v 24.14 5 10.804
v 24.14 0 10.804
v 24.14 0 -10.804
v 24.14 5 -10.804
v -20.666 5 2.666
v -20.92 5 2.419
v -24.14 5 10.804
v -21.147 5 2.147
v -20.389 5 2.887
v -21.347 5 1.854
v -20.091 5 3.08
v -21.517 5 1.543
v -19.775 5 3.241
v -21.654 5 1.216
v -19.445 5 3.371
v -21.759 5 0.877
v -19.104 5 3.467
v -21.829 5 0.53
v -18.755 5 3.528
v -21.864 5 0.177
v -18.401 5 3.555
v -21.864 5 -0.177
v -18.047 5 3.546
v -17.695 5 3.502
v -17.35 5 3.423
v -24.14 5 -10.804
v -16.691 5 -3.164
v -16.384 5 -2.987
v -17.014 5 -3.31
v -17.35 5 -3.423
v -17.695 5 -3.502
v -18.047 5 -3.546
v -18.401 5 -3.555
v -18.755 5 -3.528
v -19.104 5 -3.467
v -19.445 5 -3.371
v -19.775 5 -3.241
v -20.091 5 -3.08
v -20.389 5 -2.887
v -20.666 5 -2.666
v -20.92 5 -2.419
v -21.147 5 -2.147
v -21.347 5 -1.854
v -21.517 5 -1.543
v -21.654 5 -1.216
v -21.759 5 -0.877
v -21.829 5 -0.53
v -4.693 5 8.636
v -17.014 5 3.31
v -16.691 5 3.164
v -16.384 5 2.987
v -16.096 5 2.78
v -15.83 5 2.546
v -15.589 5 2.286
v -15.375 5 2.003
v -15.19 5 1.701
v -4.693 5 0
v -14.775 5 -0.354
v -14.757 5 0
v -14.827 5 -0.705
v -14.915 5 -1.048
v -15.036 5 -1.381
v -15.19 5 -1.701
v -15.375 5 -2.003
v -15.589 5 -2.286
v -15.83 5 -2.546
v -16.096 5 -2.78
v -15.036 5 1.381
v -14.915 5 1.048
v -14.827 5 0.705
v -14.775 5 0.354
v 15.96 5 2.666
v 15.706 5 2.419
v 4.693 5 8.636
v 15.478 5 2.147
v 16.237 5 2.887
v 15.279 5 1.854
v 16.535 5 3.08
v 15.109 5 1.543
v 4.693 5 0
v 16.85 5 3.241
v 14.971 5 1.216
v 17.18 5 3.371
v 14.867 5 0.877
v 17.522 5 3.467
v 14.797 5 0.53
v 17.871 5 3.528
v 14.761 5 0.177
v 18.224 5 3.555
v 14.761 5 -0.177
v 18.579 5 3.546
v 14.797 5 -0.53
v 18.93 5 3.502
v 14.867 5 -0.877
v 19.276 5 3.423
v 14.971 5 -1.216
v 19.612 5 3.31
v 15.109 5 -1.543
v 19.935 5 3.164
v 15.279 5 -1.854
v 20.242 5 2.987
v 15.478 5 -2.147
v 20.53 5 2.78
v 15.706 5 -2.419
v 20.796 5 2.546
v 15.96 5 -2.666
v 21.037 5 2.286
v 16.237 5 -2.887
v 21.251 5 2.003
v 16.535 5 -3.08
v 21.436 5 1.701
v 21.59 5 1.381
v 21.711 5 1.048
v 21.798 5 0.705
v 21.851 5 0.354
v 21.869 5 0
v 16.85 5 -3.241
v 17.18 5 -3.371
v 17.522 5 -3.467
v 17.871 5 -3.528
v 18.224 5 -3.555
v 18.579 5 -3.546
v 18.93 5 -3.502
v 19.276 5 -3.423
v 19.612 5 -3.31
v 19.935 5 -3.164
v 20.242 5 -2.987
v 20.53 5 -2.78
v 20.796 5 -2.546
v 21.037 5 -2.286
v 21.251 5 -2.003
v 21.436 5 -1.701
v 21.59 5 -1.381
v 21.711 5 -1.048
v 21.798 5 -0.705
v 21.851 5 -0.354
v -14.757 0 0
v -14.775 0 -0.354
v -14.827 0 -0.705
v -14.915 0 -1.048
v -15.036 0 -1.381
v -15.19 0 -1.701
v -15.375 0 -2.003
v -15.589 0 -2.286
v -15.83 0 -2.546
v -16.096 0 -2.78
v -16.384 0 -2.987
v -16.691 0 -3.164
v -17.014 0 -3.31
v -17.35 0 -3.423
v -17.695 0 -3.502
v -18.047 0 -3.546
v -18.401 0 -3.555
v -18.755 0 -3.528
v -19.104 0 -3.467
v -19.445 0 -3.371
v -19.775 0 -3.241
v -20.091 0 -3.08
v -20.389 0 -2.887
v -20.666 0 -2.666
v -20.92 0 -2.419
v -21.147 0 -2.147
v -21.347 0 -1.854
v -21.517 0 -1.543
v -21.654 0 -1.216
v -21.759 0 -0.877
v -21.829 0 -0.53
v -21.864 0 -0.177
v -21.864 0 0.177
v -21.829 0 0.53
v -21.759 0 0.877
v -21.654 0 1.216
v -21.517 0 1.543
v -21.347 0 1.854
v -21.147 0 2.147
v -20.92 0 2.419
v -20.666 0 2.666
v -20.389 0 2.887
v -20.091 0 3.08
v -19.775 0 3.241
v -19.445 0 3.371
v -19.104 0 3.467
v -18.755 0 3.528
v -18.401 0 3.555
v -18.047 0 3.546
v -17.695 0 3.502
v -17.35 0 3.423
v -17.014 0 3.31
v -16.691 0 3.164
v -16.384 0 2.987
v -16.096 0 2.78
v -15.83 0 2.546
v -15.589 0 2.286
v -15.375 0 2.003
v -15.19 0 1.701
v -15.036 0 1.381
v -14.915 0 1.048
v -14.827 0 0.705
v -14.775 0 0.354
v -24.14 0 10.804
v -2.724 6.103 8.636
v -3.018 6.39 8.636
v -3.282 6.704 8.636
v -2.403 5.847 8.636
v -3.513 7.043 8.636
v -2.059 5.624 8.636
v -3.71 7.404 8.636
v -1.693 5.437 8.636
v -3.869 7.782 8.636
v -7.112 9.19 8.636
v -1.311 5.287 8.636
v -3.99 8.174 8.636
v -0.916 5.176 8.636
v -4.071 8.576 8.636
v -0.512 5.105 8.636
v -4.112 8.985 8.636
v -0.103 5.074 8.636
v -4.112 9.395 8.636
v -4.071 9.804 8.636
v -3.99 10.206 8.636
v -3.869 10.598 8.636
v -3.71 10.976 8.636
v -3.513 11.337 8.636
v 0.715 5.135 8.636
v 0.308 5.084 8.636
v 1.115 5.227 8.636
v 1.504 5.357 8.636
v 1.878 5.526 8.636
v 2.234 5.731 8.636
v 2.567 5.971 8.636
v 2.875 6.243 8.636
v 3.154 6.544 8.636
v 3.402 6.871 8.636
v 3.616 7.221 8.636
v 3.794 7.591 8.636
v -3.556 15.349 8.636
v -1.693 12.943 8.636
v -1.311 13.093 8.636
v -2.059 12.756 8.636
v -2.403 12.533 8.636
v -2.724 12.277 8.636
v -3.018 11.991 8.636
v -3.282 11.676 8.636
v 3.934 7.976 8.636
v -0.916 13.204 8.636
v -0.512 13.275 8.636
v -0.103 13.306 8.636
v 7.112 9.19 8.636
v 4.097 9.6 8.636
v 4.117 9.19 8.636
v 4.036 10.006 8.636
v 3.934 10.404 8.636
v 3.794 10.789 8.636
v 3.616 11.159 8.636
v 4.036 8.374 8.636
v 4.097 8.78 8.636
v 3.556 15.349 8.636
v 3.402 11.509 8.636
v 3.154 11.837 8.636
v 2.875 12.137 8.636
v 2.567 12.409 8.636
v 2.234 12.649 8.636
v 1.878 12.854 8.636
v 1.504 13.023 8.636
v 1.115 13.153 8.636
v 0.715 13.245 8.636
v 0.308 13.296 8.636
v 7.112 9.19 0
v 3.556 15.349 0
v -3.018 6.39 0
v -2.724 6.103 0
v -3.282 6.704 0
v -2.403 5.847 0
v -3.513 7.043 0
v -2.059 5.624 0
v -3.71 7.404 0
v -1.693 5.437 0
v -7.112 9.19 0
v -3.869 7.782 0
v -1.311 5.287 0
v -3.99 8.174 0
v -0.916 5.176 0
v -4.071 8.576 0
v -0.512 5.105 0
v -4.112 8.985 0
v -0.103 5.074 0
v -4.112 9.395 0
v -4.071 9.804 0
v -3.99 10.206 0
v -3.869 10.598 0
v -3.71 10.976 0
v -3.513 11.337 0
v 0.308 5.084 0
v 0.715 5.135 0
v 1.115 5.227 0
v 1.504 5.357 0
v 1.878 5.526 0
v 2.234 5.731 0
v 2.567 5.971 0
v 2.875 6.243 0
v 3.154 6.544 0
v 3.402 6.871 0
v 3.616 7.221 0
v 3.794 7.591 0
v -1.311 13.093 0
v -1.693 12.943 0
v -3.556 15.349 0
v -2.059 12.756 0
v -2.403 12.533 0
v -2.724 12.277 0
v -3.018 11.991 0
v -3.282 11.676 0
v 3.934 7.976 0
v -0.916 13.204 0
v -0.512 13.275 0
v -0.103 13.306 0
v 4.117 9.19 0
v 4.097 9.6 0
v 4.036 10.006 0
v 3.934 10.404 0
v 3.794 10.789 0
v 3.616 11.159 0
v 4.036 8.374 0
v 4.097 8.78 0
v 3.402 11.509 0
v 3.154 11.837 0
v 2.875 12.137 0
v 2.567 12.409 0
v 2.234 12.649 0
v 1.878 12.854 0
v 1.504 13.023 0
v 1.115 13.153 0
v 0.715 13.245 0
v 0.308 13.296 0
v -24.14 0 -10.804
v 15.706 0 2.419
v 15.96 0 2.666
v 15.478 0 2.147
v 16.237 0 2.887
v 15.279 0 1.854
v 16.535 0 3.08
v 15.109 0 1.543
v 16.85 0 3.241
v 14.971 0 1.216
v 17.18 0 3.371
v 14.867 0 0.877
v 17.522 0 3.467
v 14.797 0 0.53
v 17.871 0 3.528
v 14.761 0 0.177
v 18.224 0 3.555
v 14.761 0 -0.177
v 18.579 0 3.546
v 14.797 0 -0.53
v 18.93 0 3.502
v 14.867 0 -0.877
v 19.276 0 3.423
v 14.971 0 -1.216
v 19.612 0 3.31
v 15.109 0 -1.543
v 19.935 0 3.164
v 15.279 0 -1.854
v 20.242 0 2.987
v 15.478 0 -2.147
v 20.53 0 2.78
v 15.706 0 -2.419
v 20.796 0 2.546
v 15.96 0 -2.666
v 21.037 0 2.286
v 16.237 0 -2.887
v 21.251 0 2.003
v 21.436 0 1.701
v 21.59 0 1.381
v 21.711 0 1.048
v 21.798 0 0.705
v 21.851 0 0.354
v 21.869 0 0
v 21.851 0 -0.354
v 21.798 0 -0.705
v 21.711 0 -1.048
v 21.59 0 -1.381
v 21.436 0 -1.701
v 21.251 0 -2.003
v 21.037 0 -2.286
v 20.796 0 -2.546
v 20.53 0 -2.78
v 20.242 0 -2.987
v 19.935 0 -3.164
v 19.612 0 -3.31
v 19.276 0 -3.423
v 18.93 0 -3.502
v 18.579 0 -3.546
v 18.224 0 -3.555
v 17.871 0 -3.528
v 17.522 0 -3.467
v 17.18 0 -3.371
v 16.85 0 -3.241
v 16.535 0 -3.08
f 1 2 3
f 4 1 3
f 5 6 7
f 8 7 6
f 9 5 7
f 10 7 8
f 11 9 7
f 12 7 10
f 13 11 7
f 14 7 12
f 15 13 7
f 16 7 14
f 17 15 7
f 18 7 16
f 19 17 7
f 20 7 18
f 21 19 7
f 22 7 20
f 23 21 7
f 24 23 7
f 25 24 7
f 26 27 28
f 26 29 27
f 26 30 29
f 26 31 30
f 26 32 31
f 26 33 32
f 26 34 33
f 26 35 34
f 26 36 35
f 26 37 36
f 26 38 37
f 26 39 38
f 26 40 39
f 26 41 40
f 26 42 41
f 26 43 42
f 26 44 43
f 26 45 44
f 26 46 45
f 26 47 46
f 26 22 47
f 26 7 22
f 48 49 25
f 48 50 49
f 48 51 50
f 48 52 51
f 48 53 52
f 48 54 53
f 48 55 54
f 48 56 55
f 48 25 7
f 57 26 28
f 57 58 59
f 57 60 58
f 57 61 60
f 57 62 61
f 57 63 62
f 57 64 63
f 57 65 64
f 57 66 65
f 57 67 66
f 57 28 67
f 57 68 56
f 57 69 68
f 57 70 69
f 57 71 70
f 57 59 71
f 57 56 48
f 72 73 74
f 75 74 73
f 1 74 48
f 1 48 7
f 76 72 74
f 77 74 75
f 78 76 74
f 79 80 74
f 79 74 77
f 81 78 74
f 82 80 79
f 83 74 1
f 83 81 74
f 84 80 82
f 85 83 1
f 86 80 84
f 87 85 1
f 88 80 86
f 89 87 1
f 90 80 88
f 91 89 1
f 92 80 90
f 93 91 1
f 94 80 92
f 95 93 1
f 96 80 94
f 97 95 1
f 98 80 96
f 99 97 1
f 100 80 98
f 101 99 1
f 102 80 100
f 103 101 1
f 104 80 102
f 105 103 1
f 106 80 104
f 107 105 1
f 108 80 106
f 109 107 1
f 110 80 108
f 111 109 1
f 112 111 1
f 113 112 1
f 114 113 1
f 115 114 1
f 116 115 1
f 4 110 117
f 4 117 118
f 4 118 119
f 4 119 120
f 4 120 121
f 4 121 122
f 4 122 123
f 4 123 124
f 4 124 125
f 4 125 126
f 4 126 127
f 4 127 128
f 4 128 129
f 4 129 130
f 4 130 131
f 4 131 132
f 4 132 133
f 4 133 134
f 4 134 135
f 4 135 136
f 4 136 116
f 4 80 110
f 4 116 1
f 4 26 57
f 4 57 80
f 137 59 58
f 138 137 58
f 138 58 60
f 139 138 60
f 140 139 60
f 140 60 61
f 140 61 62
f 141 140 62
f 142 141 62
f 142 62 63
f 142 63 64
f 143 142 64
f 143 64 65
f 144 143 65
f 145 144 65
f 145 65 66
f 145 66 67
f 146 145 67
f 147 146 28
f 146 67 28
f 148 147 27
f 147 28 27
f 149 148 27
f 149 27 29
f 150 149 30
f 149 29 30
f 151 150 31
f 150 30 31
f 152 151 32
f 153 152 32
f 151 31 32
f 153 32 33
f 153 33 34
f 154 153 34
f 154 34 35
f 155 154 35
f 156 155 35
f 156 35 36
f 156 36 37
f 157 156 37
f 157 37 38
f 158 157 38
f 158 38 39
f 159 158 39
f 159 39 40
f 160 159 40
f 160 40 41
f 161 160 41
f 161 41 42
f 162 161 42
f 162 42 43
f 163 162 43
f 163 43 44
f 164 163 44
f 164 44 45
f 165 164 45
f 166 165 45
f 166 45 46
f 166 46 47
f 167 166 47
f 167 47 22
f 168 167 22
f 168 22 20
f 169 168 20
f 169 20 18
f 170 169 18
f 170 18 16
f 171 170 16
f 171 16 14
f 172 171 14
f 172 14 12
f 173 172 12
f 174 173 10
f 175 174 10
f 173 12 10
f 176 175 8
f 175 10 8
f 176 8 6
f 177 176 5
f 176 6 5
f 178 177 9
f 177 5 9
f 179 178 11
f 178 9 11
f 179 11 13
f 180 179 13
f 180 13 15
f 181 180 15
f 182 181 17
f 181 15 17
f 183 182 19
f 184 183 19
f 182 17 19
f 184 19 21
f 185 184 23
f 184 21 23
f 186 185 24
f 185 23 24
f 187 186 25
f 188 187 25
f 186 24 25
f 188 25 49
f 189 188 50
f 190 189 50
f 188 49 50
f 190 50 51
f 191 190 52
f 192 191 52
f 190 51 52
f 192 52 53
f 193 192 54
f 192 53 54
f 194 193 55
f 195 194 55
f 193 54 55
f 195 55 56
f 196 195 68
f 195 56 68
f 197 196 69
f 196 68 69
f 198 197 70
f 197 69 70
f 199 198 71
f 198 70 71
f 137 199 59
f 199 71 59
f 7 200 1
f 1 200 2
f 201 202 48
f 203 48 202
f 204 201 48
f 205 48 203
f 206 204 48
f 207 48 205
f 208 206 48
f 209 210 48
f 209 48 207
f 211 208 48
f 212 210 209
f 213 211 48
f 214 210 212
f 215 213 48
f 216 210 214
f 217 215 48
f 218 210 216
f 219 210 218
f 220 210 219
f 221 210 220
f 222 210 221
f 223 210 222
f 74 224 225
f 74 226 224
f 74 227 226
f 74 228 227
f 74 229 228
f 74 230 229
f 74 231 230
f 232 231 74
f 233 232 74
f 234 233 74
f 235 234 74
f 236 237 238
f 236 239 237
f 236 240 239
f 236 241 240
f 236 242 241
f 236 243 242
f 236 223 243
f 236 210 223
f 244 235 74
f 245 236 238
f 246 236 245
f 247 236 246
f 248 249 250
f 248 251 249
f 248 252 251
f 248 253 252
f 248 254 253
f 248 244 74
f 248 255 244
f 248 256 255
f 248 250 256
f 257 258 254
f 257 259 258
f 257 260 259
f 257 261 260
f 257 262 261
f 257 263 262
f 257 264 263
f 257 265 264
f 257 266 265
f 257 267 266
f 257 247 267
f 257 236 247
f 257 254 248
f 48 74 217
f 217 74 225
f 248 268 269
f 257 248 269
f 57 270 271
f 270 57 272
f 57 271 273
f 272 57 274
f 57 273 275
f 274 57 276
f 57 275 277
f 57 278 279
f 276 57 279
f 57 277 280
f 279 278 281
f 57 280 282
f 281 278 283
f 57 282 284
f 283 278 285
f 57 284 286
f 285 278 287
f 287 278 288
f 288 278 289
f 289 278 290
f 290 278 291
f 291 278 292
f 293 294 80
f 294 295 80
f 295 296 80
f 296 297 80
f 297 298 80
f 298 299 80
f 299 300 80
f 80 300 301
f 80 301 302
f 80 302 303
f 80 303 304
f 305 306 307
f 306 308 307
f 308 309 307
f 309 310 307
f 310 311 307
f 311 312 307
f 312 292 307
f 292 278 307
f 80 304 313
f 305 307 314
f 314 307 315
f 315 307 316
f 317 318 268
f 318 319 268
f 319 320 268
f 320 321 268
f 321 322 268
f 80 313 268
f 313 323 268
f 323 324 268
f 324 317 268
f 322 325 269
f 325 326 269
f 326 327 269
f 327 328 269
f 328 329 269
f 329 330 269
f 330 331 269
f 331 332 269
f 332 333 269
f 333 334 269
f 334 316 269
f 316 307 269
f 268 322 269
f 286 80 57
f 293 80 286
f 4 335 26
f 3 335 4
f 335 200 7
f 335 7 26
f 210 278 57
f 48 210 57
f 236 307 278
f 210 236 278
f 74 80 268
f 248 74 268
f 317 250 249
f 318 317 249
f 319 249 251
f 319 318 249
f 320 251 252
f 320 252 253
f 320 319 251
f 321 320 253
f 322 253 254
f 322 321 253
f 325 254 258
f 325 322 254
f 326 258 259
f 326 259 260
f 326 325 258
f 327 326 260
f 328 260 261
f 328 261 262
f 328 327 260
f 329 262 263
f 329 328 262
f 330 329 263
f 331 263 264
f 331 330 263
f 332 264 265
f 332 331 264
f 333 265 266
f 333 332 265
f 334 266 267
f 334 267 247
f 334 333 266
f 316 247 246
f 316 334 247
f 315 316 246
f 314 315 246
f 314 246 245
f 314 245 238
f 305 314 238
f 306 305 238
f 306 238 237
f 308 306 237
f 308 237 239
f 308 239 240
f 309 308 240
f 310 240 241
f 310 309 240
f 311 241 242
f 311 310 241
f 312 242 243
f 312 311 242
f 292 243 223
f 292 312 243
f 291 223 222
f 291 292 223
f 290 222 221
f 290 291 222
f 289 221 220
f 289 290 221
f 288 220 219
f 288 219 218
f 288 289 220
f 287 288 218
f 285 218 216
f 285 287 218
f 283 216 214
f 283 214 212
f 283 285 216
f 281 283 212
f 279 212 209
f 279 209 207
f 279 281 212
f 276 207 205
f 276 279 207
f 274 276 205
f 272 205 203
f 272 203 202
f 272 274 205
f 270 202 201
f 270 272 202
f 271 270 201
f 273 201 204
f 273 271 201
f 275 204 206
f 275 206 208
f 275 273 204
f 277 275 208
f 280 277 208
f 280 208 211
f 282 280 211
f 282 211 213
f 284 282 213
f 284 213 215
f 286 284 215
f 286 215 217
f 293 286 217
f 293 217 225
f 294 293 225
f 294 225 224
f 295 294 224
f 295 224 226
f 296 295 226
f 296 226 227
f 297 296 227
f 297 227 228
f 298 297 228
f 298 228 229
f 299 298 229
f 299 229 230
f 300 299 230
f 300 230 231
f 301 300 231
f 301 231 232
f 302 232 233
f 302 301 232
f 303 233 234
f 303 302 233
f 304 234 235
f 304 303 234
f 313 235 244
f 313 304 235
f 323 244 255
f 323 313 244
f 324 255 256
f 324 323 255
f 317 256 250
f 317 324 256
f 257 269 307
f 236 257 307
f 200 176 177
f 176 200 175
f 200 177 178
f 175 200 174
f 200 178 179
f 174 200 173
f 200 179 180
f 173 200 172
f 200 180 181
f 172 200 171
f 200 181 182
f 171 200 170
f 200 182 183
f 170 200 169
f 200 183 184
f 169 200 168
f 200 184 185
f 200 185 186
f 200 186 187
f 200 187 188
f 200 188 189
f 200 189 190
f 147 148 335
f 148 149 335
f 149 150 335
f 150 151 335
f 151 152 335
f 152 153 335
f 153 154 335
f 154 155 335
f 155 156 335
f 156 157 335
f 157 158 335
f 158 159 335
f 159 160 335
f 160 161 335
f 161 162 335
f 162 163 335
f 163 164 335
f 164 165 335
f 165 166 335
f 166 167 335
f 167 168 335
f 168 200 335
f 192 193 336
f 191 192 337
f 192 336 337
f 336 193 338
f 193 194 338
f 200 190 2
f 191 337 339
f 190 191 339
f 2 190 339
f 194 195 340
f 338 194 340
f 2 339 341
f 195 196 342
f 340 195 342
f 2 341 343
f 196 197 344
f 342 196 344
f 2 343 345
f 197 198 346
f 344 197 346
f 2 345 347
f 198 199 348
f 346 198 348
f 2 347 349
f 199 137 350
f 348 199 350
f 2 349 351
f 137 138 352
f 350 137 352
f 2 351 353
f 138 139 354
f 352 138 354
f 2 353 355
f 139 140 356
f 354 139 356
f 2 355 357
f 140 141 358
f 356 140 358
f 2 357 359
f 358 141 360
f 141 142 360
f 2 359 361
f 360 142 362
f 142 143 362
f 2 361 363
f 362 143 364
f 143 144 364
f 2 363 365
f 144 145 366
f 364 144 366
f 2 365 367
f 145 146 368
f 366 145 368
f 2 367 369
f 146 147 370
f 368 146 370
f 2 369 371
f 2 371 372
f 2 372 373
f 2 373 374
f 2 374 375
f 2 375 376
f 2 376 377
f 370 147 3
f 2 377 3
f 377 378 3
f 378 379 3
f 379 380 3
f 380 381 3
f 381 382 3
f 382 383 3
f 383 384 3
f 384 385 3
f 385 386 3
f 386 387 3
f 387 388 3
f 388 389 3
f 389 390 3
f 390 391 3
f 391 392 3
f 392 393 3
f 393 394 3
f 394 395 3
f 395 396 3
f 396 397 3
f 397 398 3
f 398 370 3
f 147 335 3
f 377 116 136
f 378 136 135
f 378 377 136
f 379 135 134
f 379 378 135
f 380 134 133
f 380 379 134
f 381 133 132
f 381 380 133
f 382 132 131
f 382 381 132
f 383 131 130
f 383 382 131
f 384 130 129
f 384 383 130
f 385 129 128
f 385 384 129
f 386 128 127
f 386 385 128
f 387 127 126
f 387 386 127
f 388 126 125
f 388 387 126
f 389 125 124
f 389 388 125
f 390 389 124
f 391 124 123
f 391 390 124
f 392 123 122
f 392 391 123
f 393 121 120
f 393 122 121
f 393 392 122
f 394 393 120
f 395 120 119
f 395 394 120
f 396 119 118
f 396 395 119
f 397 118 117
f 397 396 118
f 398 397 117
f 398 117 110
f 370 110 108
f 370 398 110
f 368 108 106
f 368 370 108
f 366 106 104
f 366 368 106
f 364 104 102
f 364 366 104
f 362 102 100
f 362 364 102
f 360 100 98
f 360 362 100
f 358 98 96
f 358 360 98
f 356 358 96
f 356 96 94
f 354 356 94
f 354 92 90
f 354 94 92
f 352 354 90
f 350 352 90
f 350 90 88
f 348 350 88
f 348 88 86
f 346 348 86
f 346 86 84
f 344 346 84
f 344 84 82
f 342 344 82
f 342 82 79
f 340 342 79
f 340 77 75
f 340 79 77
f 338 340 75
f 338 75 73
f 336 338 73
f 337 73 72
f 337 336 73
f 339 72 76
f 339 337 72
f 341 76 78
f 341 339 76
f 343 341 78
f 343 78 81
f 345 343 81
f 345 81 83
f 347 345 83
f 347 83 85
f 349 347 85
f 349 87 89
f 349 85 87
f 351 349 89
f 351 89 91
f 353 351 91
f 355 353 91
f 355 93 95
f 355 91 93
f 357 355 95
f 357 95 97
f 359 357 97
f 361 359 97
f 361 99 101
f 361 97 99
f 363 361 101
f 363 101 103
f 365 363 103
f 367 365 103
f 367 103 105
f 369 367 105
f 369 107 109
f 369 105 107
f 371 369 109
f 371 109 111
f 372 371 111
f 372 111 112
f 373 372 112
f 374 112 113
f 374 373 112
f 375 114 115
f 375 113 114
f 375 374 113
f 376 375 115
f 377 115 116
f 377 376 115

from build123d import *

# Parameters (mm, degrees)
CROQUIS1_W                 = 48.280426218
CROQUIS1_H                 = 21.608022922
SALIENTE_EXTRUIR1_DEPTH    = 5
CROQUIS2_R                 = 2.974152903
CORTAR_EXTRUIR1_DEPTH      = 15
CORTAR_EXTRUIR1_DEPTH_BACK = 23
CROQUIS3_R                 = 3.556
CORTAR_EXTRUIR2_DEPTH      = 31.496
CORTAR_EXTRUIR2_DEPTH_BACK = 20.828
CROQUIS4_R                 = 3.556
CORTAR_EXTRUIR3_DEPTH      = 8.636
CORTAR_EXTRUIR3_DEPTH_BACK = 20.828
CROQUIS5_R                 = 4.117290135
SALIENTE_EXTRUIR2_DEPTH    = 8.636


with BuildPart() as part:
    # Croquis1 → Saliente-Extruir1 (new body)
    with BuildSketch(Plane(origin=(0, 0, 0), x_dir=(1, 0, 0), z_dir=(0, 1, 0))):
        Rectangle(CROQUIS1_W, CROQUIS1_H)
    extrude(amount=SALIENTE_EXTRUIR1_DEPTH)

    # Croquis2 → Cortar-Extruir1 (cut, two sides)
    with BuildSketch(Plane(origin=(0, 0, 0), x_dir=(1, 0, 0), z_dir=(0, 1, 0))) as cortar_extruir1_sk:
        with Locations((18.312839715, 0)):
            Circle(CROQUIS2_R)
        with Locations((-18.312839715, 0)):
            Circle(CROQUIS2_R)
    extrude(amount=CORTAR_EXTRUIR1_DEPTH, mode=Mode.SUBTRACT)
    extrude(cortar_extruir1_sk.sketch, amount=-CORTAR_EXTRUIR1_DEPTH_BACK, mode=Mode.SUBTRACT)

    # Croquis3 → Cortar-Extruir2 (cut, two sides)
    with BuildSketch(Plane(origin=(0, 0, 0), x_dir=(1, 0, 0), z_dir=(0, 1, 0))) as cortar_extruir2_sk:
        with Locations((18.312839715, 0)):
            Circle(CROQUIS3_R)
    extrude(amount=CORTAR_EXTRUIR2_DEPTH, mode=Mode.SUBTRACT)
    extrude(cortar_extruir2_sk.sketch, amount=-CORTAR_EXTRUIR2_DEPTH_BACK, mode=Mode.SUBTRACT)

    # Croquis4 → Cortar-Extruir3 (cut, two sides)
    with BuildSketch(Plane(origin=(0, 5, 0), x_dir=(1, 0, 0), z_dir=(0, 1, 0))) as cortar_extruir3_sk:
        with Locations((-18.312839715, 0)):
            Circle(CROQUIS4_R)
    extrude(amount=CORTAR_EXTRUIR3_DEPTH, mode=Mode.SUBTRACT)
    extrude(cortar_extruir3_sk.sketch, amount=-CORTAR_EXTRUIR3_DEPTH_BACK, mode=Mode.SUBTRACT)

    # Croquis5 → Saliente-Extruir2 (add)
    with BuildSketch(Plane.XY):
        Polygon((7.112251642, 9.190063188), (3.556125821, 15.349453788), (-3.556125821, 15.349453788), (-7.112251642, 9.190063188), (-3.556125821, 3.030672588), (3.556125821, 3.030672588), align=None)
        with Locations((0, 9.190063188)):
            Circle(CROQUIS5_R, mode=Mode.SUBTRACT)
    extrude(amount=SALIENTE_EXTRUIR2_DEPTH)


solid = part.part
